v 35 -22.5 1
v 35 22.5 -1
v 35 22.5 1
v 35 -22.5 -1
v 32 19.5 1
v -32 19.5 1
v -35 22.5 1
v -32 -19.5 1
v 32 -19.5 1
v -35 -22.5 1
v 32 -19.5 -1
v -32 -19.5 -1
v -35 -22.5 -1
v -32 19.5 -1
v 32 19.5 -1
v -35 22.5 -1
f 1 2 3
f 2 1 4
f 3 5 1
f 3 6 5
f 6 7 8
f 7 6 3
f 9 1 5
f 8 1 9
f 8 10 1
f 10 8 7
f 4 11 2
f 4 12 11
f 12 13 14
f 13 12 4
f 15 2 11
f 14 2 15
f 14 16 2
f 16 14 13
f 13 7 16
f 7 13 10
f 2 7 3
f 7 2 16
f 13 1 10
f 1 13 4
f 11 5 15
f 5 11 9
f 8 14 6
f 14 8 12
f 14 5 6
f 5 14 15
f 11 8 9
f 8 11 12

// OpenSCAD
// file: controller.scad
echo("Работа Асыловой Анастасии!");

w_back = 70;
h_back = 45;
w_controller = 20;
thickness_bottom = 2;
thickness_walls = 2;
thickness_top = 2;
h_walls = 4;
gap_backlight = 1.5;
width_frame_window = 3;

kit_controller();
//walls();
//debug_controller();

module frame_controller(){
    difference(){
        cube([w_controller, h_back, thickness_top], center=true);
        color("red")
        cube([w_controller-2*width_frame_window, h_back-2*width_frame_window, thickness_top+1], center=true);
    }
}

module debug_controller() {
    difference(){
        kit_controller();
        translate([-w_controller/2, 0, h_walls/2])
        color("green")
        cube([w_controller, h_back+2*thickness_walls+1+gap_backlight, h_walls*2], center = true);
    }
}


module kit_controller(){
    controller();
    translate([0, 0, h_walls/2])
    walls();
    color("purple")
    translate([0, 0, thickness_bottom])
    frame_controller();
}
module walls(){
    difference(){
        cube([w_controller+2*thickness_walls+gap_backlight, h_back+2*thickness_walls+gap_backlight, thickness_bottom+h_walls], center=true);
        color("red")
        cube([w_controller+gap_backlight, h_back+gap_backlight, thickness_bottom+h_walls+1], center=true);
        translate([-w_controller - thickness_walls+gap_backlight/2-0.24, 0, 0])
        cube([w_controller+gap_backlight, h_back+gap_backlight+2*thickness_walls+1, thickness_bottom+h_walls+1], center=true);
    }
}

module controller(){
    cube([w_controller+gap_backlight, h_back+gap_backlight, thickness_bottom], center=true);
}
// file: akkum_18650.scad
echo("Работа Асыловой Анастасии");

d_akkum = 18;
h_akkum = 65;

twoAcc();

module twoAcc() {
translate([0, -d_akkum/2-1, d_akkum/2+1])
rotate([0, 90, 0])
akkum18650();
    
translate([0, d_akkum/2+1, d_akkum/2+1])
rotate([0, 90, 0])
akkum18650();
    
translate([-33, -10, 0])
import("flexbatter18650x2.stl");
}

module akkum18650(){
    color("purple")
    cylinder(d=d_akkum, h=h_akkum, $fn=32, center = true);
}
// main file
use <akkum_18650.scad>
use <controller.scad>

echo("Работа Асыловой Анастасии!");

thickness_frame = 4;
thickness_walls = 2;
thickness_bottom = 2;
thickness_top = 2;
width_frame_window = 3;

w_controller = 20;

w_back = 70;
h_back = 45;

thickness_back = 1;
h_walls = 4;
d_wires = 1.2;

d_akkum = 18;
h_akkum = 65;

gap_backlight = 1.5;

//kit_frame();
//translate([w_back/2+w_controller/2+2*thickness_walls-0.5, 0, 0])
//kit_controller();

//translate([1, 0, 0])
//debug_controller();
//frame_debug();

//translate([0, 0, thickness_bottom/2+thickness_top/2])
window_frame();
//walls();

module window_frame(){
    difference(){
        color("green")
        cube([w_back, h_back, thickness_top], center = true);
        color("red")
        cube([w_back-width_frame_window*2, h_back-width_frame_window*2, thickness_top+1], center = true);
    }
}

module frame_debug(){
    difference(){
    kit_frame();
    translate([w_back/2, 0, h_walls-thickness_bottom])
    cube([w_back, h_back+2*thickness_walls+2, h_walls*2], center = true);
    }
}

module kit_frame(){
    bottom();
    translate([0,0,h_walls/2+thickness_bottom/2])
    walls();
    wires();
    translate([0, 0, thickness_bottom/2+thickness_top/2])
    window_frame();
}

module wires() {
    translate([w_back/2, -h_back/2+6, h_walls/2+0.5])
    rotate([0, 90, 0])
    color("red")
    cylinder(d=d_wires, h=25, center=true, $fn=25);
    
    translate([w_back/2, -h_back/2+2, h_walls/2+0.5])
    rotate([0, 90, 0])
    color("black")
    cylinder(d=d_wires, h=25, center=true, $fn=25);
}

module walls(){
    difference(){
        cube([w_back+2*thickness_walls+gap_backlight, h_back+2*thickness_walls+gap_backlight, h_walls], center = true);
        color("red")
        cube([w_back+gap_backlight, h_back+gap_backlight, h_walls+1], center = true);
    }
}
module backlight(){
    color("lightgreen")
    cube([w_back, h_back, thickness_back], center = true);
}

module bottom(){
    cube([w_back+2*thickness_walls+gap_backlight, h_back+2*thickness_walls+gap_backlight, thickness_bottom], center = true);
}
